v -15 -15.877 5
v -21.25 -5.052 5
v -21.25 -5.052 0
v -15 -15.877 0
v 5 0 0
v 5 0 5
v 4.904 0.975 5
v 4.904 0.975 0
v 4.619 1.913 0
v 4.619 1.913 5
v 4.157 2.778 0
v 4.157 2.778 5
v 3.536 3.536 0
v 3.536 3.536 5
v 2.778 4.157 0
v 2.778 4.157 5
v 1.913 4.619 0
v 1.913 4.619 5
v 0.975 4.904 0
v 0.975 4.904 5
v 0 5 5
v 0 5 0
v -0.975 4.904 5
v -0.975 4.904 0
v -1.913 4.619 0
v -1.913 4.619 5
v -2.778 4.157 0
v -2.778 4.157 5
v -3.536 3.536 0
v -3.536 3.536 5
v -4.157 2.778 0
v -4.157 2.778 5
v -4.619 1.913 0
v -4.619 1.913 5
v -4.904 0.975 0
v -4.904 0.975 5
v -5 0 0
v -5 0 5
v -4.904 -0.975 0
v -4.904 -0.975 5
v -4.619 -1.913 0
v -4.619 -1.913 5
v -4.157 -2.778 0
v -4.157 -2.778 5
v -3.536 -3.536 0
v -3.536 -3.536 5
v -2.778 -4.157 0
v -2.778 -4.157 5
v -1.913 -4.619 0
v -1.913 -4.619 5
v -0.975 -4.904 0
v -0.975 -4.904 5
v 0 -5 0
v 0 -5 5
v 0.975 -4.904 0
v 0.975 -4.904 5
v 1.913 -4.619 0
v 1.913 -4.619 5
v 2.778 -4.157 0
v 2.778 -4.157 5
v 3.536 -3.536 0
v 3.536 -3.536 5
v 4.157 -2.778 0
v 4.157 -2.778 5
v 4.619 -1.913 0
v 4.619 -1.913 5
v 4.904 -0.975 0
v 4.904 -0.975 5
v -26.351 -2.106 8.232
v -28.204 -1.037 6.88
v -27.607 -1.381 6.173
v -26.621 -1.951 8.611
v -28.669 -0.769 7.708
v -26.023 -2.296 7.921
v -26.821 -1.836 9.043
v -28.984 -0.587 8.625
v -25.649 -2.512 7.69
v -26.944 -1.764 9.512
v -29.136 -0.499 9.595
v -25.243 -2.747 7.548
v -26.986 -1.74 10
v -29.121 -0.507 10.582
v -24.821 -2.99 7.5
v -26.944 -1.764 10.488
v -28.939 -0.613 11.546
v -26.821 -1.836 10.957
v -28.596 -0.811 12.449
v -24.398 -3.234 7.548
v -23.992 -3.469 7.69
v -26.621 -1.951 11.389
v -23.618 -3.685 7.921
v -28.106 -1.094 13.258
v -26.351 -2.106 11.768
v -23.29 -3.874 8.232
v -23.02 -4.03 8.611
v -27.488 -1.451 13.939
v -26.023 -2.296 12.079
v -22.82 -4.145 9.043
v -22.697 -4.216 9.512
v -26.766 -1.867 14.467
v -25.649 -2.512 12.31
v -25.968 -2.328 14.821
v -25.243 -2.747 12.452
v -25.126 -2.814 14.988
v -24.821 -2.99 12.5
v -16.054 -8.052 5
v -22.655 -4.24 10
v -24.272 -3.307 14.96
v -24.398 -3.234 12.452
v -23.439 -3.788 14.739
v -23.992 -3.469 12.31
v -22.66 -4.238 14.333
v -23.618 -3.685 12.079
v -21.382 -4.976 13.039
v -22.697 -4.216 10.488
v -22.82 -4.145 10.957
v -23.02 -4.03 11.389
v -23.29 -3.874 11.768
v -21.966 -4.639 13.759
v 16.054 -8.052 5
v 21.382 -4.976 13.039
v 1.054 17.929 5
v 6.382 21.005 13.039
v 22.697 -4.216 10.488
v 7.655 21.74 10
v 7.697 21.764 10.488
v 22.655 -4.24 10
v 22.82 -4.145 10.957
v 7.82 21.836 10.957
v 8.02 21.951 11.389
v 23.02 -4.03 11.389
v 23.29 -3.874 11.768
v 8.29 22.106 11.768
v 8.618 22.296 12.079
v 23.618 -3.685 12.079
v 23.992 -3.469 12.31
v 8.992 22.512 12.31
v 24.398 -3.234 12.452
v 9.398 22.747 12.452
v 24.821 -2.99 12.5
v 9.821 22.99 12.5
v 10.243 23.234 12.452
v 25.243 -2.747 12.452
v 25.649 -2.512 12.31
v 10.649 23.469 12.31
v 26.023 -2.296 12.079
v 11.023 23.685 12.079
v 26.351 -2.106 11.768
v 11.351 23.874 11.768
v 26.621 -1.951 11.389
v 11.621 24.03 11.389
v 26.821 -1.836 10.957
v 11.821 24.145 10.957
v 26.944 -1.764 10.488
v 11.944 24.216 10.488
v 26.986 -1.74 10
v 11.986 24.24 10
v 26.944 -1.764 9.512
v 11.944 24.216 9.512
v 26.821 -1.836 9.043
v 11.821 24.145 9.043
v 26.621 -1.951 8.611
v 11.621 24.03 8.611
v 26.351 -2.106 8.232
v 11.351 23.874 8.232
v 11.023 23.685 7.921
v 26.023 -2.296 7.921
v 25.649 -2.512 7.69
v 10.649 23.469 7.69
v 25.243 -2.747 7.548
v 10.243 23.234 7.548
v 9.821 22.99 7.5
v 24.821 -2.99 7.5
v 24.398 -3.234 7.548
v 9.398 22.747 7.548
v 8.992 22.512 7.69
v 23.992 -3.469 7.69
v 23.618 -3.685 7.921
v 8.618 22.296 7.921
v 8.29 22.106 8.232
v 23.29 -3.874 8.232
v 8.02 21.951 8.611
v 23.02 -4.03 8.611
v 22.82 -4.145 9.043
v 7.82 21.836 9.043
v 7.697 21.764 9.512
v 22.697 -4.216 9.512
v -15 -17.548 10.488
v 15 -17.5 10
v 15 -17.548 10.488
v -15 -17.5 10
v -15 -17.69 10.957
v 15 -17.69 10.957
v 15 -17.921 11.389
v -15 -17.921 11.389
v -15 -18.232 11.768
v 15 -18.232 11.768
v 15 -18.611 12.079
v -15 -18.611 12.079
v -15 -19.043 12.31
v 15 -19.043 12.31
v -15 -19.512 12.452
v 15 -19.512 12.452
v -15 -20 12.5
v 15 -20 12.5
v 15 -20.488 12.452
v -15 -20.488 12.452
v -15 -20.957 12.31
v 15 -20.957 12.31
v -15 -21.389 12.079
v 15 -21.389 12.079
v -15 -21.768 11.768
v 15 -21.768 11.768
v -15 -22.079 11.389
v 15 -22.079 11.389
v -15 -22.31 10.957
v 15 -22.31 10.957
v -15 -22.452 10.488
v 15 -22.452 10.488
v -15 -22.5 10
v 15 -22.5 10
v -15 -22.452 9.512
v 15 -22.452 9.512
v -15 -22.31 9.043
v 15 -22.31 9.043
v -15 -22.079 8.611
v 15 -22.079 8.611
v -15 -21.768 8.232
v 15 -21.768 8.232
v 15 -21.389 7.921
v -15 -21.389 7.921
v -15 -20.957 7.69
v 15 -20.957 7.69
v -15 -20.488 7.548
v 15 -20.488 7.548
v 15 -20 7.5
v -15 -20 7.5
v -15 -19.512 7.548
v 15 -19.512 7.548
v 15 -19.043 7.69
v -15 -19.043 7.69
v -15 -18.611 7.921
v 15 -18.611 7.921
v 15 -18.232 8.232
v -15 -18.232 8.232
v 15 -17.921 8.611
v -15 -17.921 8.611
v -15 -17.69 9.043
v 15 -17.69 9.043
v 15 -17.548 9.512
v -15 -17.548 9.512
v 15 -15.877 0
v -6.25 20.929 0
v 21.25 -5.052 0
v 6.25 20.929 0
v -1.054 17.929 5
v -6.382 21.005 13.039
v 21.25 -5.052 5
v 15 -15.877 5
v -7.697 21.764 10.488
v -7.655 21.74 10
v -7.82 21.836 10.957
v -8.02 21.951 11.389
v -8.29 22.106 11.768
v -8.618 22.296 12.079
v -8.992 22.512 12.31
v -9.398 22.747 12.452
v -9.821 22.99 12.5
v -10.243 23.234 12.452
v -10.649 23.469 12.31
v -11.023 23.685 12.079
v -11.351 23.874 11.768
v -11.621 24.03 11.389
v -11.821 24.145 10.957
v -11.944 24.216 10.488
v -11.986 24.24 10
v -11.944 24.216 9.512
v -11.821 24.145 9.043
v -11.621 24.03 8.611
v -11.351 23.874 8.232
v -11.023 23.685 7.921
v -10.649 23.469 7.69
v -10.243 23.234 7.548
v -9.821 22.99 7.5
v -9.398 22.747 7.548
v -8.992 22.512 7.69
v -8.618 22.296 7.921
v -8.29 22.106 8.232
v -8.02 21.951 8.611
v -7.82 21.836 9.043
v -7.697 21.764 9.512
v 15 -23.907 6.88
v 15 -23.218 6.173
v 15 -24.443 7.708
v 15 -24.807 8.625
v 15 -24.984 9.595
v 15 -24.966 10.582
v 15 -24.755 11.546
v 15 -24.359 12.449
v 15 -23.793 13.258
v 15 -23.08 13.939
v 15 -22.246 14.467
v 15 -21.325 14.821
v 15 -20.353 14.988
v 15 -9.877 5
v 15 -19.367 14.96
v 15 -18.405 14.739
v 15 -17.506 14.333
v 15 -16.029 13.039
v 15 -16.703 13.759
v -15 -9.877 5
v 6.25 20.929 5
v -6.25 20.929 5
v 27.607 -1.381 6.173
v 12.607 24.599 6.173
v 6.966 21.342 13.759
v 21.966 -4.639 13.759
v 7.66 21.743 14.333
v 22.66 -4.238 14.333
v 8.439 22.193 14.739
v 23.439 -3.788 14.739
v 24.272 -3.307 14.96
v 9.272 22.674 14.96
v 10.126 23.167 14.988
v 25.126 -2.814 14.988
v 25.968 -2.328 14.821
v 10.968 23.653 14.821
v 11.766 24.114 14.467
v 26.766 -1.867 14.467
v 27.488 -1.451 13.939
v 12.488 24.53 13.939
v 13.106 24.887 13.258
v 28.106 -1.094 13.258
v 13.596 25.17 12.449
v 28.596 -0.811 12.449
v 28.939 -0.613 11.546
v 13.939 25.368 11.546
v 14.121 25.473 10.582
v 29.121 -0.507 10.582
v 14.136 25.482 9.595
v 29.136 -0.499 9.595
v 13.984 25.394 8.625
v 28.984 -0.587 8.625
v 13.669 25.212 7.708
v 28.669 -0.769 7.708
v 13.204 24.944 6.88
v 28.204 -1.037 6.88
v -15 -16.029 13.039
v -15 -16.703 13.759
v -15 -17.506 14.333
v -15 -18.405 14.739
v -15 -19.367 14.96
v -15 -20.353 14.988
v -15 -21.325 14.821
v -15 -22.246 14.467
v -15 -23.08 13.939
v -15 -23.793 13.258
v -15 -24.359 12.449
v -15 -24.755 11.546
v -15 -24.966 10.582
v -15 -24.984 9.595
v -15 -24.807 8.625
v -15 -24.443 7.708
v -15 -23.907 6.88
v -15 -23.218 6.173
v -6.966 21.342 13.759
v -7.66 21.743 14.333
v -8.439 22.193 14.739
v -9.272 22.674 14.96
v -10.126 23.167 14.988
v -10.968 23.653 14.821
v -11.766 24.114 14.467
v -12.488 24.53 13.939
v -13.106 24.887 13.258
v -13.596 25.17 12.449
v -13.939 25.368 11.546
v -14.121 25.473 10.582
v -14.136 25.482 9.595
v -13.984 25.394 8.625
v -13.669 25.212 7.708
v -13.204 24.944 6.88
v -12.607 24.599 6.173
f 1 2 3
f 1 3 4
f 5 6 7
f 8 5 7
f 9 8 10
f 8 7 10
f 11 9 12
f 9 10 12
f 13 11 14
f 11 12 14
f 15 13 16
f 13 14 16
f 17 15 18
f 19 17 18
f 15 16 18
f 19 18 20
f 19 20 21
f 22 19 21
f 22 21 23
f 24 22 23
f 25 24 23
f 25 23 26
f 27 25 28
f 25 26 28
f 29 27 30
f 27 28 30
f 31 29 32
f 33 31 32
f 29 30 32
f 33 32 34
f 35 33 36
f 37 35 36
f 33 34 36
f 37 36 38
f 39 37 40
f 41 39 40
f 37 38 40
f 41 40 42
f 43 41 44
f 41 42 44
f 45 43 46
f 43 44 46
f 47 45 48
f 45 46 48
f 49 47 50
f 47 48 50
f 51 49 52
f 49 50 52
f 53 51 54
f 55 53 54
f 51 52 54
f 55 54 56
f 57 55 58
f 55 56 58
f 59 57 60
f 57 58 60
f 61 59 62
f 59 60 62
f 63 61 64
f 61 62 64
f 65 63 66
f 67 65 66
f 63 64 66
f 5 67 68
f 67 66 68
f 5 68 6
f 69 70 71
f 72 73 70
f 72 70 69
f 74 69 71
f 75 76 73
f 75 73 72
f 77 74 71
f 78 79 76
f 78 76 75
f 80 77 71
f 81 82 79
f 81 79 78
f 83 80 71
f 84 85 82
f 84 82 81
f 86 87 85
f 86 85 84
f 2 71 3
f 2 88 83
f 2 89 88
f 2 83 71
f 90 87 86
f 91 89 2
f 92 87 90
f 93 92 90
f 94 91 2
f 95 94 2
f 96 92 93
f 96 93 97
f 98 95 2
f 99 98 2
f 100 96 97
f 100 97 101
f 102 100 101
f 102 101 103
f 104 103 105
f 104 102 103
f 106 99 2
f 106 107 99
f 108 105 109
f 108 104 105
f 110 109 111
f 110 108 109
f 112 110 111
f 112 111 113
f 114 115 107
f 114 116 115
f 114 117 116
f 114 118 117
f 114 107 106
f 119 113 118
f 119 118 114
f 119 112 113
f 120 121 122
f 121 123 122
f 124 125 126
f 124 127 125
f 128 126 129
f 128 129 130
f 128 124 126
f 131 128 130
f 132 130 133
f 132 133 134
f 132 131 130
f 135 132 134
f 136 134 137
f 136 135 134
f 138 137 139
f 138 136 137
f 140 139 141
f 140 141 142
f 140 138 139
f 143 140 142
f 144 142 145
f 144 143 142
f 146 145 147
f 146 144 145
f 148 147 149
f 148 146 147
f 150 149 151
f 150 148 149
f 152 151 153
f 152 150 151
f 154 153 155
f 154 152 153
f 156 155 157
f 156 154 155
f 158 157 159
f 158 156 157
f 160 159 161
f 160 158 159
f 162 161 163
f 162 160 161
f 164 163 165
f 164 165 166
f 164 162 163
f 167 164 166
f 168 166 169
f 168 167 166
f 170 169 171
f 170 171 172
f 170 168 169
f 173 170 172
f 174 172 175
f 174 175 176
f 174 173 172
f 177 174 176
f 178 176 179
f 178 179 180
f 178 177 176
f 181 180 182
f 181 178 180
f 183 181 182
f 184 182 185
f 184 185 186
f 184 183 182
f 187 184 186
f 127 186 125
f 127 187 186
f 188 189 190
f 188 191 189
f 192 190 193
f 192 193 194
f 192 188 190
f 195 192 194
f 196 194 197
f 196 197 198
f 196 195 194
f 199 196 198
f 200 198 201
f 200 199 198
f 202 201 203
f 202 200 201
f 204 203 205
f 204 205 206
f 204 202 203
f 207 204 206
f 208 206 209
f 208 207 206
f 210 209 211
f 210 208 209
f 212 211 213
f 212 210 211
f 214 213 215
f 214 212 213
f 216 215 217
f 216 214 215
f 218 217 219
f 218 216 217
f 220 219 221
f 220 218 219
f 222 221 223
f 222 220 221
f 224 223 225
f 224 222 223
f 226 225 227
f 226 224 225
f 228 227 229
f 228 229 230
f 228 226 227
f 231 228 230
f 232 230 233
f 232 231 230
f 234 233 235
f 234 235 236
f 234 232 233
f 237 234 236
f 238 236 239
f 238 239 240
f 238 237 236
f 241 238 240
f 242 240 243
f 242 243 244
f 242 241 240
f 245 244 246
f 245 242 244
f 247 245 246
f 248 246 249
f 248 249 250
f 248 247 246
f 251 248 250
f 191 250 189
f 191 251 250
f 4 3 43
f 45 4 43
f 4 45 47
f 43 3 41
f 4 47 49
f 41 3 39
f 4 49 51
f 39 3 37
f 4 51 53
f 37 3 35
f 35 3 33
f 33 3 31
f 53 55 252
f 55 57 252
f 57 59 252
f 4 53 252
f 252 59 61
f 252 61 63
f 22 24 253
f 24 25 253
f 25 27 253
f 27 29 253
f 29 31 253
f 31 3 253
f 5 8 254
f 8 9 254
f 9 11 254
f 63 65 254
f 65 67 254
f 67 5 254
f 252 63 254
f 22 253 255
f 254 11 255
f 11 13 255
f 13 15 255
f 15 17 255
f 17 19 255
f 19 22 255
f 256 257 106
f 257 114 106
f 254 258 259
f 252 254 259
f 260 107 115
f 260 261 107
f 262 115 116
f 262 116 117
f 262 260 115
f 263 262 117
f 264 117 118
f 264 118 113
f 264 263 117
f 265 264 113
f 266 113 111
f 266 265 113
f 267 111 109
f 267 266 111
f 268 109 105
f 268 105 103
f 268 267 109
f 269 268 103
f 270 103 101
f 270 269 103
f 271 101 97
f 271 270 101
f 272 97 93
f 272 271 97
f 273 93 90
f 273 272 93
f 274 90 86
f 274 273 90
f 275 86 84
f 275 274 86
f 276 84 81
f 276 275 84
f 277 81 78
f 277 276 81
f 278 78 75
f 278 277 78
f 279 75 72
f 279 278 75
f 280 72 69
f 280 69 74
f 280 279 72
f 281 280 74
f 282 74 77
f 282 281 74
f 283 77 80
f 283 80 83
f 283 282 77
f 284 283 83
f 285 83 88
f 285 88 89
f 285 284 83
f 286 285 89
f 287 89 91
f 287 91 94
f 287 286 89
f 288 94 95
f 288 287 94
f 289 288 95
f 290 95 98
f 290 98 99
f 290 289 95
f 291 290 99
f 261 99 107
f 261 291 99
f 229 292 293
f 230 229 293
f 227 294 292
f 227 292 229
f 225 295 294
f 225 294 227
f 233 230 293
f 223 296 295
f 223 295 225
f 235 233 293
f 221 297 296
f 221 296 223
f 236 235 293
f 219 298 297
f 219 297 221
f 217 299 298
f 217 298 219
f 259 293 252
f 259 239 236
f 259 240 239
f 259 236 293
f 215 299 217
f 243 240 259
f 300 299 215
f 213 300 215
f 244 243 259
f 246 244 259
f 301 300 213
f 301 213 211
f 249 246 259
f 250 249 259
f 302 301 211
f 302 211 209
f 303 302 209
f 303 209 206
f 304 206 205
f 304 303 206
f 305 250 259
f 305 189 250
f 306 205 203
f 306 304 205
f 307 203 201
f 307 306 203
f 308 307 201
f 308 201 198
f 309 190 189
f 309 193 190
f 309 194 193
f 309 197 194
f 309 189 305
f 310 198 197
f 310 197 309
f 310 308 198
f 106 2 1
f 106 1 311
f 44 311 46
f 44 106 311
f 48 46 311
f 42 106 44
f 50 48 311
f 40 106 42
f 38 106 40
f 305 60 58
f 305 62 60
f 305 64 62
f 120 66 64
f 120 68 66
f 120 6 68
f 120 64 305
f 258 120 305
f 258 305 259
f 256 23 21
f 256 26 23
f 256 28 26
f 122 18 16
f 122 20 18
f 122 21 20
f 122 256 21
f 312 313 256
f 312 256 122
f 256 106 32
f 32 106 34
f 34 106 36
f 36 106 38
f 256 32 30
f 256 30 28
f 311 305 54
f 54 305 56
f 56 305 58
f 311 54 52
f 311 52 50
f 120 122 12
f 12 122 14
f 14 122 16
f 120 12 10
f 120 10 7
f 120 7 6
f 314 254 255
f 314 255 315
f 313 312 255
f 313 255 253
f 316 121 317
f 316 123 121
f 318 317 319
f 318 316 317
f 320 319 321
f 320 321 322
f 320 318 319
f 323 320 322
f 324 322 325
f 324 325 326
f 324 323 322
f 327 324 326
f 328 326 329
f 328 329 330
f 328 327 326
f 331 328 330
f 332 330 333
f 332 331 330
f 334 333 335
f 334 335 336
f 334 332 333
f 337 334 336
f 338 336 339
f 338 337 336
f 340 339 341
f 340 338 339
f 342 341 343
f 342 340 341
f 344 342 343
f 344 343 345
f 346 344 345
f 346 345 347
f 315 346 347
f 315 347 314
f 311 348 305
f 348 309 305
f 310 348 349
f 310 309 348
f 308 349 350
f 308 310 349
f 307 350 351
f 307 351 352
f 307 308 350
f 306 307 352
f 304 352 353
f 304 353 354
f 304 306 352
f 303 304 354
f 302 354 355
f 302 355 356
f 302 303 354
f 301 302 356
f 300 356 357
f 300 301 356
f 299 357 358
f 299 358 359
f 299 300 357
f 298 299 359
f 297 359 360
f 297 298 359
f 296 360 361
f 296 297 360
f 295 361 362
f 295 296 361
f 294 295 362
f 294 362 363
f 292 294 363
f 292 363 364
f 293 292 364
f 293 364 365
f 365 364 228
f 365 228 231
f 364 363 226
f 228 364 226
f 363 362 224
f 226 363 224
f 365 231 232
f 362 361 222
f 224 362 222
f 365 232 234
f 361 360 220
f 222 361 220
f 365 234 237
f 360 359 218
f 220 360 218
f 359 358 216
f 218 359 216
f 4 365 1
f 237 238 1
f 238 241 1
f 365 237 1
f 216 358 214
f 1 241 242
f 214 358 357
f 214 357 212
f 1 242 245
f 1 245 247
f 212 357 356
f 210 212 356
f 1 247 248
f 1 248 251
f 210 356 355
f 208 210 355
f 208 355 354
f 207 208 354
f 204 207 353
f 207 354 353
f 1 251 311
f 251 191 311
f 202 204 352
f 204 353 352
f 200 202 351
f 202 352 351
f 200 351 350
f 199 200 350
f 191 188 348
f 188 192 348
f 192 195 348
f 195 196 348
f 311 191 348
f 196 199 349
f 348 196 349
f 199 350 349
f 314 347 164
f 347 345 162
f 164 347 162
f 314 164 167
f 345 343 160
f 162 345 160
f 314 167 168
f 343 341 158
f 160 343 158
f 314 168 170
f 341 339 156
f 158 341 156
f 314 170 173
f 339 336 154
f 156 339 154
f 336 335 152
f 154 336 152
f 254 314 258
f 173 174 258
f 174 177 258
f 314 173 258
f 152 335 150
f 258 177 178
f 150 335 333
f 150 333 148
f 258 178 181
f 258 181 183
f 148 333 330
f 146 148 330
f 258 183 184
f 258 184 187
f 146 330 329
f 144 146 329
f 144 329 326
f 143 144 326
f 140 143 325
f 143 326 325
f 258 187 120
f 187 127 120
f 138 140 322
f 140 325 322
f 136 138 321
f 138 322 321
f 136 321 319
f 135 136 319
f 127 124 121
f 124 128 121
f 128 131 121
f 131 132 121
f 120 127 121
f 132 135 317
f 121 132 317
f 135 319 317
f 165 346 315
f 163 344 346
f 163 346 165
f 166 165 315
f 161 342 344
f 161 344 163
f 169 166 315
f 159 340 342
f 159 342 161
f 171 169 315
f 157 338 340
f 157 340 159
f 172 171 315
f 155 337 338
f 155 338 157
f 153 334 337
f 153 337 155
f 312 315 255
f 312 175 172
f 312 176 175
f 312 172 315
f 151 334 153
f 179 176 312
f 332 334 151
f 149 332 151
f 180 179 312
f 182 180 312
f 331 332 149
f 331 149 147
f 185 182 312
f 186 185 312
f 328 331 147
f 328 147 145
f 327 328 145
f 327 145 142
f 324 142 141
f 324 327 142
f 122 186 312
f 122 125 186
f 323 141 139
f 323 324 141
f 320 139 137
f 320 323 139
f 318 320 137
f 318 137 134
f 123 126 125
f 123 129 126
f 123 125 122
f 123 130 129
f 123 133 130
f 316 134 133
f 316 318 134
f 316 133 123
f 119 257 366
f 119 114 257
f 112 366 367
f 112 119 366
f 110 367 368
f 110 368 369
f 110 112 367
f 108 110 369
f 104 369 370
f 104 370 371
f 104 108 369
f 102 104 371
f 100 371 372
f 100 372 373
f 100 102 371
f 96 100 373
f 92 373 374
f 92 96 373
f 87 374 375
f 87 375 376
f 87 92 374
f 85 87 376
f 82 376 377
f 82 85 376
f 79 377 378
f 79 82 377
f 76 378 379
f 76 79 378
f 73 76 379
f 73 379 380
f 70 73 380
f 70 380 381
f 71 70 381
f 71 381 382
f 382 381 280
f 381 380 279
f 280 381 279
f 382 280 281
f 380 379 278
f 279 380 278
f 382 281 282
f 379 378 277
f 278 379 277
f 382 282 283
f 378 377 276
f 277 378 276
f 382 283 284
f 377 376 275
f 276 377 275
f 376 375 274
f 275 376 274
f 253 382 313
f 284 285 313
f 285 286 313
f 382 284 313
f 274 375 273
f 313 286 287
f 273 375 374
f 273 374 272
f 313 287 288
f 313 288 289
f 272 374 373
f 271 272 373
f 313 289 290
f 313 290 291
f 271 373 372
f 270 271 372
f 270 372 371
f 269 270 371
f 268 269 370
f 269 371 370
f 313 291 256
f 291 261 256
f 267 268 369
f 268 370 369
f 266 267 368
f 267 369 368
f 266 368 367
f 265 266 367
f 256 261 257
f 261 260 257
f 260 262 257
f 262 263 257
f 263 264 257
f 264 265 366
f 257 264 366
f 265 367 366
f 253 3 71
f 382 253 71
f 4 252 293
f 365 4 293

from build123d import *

# Parameters (mm, degrees)
PAD_DEPTH          = 5
POCKET_DEPTH       = 5.001
SKETCH002_R        = 5
POCKET001_DEPTH    = 5
SKETCH003_R        = 2.5
PAD001_DEPTH       = 15
POLARPATTERN_COUNT = 3


with BuildPart() as part:
    # Sketch → Pad (new body)
    with BuildSketch(Plane.XY):
        Polygon((0, 31.754265), (-27.5, -15.877132), (27.5, -15.877132), align=None)
    extrude(amount=PAD_DEPTH)

    # Sketch001 (on Face5 of Pad) → Pocket (cut, through all)
    with BuildSketch(Plane.XY.offset(5)):
        Polygon((-21.25, -5.051815), (-15, -15.877132), (-27.5, -15.877132), align=None)
        Polygon((27.5, -15.877132), (21.25, -5.051815), (15, -15.877132), align=None)
        Polygon((0, 31.754265), (6.25, 20.928947), (-6.25, 20.928947), align=None)
    extrude(amount=-POCKET_DEPTH, mode=Mode.SUBTRACT)

    # Sketch002 (on Face4 of Pocket) → Pocket001 (cut)
    with BuildSketch(Plane.XY.offset(5)):
        Circle(SKETCH002_R)
    extrude(amount=-POCKET001_DEPTH, mode=Mode.SUBTRACT)

    # Sketch003 → Pad001 (join, symmetric)
    with BuildSketch(Plane.YZ):
        with BuildLine():
            ThreePointArc((-16.02939, 13.038792), (-23.453338, 13.615862), (-23.218057, 6.173238))
            Line((-15.877132, 0), (-23.218057, 6.173238))
            Line((-15.877132, 5), (-15.877132, 0))
            Line((-9.877132, 5), (-15.877132, 5))
            Line((-16.02939, 13.038792), (-9.877132, 5))
        make_face()
        with Locations((-20, 10)):
            Circle(SKETCH003_R, mode=Mode.SUBTRACT)
    pad001 = extrude(amount=PAD001_DEPTH, both=True)

    # PolarPattern: Pad001 ×3 about axis
    polarpattern_axis = Axis((0, 0, 0), (0, 0, 1))
    for i in range(1, POLARPATTERN_COUNT):
        add(pad001.rotate(polarpattern_axis, i * 360 / POLARPATTERN_COUNT))


solid = part.part
